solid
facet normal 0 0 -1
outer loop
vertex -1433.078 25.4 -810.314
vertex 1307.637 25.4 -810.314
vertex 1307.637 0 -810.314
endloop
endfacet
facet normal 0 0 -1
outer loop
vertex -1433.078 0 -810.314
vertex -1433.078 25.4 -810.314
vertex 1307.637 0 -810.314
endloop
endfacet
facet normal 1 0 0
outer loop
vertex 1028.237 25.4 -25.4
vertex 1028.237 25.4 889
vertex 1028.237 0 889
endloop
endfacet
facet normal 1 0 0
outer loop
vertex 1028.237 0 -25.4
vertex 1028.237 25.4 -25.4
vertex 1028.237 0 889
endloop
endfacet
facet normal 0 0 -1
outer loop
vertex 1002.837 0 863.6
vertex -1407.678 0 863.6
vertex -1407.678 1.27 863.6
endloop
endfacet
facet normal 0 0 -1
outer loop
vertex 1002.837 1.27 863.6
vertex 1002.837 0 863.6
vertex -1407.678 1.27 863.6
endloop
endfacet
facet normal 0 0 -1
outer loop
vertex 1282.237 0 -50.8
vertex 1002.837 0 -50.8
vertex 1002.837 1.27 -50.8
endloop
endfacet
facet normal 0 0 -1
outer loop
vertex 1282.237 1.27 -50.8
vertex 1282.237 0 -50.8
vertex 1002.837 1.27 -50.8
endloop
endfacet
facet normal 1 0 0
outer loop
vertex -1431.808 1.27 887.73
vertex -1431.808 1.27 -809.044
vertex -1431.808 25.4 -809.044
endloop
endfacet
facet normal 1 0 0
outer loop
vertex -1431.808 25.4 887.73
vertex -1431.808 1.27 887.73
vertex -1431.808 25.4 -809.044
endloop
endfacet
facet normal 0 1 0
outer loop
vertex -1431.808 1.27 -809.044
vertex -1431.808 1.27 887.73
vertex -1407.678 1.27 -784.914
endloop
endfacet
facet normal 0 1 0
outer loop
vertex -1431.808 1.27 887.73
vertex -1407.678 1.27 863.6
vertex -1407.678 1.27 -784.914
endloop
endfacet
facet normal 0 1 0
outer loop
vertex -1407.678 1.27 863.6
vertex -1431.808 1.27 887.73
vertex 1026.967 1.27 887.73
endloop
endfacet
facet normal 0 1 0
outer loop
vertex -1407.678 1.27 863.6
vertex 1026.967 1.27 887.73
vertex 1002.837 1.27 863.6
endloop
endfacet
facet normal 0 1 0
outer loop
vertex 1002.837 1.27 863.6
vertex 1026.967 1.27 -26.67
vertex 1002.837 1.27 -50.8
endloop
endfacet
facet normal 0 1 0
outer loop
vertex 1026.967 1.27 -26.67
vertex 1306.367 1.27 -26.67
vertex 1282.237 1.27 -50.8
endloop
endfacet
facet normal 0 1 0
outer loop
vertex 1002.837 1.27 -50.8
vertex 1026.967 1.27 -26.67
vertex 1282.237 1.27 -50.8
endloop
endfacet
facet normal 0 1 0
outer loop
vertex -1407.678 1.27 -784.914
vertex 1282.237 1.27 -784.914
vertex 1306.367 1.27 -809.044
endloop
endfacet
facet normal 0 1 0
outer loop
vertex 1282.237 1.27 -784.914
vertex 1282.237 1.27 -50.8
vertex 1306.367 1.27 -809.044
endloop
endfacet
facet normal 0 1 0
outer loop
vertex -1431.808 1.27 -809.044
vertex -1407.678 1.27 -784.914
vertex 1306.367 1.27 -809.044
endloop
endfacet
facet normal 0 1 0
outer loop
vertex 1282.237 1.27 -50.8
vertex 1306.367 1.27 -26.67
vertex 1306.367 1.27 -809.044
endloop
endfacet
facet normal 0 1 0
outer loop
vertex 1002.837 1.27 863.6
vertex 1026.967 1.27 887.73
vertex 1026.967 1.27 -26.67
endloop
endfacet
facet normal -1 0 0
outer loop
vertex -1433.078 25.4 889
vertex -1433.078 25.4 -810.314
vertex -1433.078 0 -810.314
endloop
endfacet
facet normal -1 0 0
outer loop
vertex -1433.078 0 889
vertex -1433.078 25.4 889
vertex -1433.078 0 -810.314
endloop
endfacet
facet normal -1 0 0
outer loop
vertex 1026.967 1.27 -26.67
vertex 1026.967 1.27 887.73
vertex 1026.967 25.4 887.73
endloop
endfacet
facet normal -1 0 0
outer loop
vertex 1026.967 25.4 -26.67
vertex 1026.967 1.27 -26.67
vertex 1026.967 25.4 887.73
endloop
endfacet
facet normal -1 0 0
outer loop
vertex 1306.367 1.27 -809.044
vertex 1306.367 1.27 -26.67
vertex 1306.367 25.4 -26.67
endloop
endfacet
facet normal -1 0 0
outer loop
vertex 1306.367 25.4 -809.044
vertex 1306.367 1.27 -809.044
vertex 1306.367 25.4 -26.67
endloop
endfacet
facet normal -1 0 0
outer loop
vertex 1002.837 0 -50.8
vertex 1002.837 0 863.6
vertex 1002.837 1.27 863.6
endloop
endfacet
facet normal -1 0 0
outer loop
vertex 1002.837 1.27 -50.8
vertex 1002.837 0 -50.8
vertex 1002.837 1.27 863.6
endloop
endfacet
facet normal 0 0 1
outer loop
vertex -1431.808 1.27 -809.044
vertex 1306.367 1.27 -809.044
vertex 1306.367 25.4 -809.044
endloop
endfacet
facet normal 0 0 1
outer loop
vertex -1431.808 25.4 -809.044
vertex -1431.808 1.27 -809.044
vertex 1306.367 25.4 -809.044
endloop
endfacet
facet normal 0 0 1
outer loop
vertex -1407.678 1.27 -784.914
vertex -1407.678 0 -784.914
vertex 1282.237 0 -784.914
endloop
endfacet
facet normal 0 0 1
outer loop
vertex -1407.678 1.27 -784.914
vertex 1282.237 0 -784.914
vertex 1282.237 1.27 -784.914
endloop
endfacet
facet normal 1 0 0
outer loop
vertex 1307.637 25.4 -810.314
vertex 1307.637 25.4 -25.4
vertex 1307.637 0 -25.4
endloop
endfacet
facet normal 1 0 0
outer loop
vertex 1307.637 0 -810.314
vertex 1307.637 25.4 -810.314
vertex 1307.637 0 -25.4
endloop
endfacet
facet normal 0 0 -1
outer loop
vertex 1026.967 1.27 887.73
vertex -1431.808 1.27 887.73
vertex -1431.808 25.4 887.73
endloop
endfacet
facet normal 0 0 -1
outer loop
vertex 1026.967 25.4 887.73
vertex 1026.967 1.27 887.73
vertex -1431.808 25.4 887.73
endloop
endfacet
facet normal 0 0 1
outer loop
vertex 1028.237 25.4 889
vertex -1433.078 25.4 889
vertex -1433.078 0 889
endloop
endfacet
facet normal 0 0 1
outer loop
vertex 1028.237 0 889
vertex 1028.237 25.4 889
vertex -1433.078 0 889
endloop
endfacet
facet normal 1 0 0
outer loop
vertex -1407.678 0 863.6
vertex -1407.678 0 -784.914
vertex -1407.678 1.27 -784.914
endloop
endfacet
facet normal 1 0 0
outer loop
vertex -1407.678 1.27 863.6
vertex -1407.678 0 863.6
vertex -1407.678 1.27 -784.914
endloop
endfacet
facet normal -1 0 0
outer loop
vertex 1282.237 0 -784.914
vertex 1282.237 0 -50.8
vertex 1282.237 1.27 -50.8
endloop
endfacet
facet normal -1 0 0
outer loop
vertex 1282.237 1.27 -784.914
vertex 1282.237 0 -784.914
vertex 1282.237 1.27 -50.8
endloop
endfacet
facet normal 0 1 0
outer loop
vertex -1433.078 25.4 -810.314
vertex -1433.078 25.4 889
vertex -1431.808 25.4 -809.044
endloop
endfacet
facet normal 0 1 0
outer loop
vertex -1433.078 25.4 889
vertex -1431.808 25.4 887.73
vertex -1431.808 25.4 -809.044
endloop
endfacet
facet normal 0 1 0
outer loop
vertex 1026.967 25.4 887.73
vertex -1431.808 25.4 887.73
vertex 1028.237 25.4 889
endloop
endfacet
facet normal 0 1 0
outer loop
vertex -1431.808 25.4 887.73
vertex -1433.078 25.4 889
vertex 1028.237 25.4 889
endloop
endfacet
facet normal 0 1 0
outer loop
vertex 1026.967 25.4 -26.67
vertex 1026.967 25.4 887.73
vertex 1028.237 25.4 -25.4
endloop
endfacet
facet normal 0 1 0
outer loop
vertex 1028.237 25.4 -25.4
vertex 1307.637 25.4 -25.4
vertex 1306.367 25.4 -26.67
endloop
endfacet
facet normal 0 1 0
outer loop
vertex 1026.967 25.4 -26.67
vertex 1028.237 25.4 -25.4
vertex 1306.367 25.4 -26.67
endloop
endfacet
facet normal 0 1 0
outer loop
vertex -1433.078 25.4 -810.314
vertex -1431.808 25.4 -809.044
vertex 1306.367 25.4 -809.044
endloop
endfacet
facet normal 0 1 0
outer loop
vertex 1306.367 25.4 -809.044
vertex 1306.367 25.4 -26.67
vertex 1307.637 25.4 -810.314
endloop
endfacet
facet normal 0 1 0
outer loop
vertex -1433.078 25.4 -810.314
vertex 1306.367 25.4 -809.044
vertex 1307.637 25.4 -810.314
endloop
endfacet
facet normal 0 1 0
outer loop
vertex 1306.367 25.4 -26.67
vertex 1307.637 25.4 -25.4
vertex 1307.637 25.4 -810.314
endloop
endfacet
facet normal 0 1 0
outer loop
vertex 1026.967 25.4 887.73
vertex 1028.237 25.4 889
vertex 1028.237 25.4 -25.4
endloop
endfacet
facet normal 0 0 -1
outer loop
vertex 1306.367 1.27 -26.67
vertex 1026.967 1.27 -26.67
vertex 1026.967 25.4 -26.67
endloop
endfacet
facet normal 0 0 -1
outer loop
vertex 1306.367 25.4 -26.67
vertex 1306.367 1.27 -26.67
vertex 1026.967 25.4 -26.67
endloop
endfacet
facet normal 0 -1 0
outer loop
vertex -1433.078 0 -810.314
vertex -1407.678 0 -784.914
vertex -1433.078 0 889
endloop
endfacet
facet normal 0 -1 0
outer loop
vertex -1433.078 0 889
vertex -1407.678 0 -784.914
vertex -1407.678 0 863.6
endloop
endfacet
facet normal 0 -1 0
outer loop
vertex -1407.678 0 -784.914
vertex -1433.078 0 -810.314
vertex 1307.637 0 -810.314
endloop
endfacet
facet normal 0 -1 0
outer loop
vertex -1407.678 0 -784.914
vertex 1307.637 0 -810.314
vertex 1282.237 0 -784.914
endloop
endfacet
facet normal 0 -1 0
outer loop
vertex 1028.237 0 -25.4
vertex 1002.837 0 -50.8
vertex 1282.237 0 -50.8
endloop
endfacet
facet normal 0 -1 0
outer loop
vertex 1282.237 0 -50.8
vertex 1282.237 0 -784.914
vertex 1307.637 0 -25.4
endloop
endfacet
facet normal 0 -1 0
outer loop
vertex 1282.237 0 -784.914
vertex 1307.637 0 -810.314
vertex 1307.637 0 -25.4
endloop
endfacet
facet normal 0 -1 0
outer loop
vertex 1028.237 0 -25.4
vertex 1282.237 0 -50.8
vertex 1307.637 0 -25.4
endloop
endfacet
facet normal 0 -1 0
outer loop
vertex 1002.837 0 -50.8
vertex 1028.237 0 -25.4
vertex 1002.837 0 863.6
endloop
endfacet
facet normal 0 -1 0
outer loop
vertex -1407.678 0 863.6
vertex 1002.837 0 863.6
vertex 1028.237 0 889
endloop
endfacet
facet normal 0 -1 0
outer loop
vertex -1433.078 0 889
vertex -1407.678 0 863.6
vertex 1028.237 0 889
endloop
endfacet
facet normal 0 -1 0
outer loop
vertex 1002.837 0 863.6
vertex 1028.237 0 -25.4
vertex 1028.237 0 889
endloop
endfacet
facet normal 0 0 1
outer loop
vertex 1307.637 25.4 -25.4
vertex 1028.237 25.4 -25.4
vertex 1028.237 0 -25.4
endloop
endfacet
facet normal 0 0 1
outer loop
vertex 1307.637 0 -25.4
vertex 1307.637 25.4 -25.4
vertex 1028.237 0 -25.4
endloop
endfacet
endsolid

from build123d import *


with BuildPart() as part:
    # Sweep1: sweep along a path in Sketch1
    with BuildLine(Plane(origin=(0, 0, 0), x_dir=(1, 0, 0), z_dir=(0, 1, 0))) as sweep1_path:
        Line((-1459.720419904, 836.957191151), (1334.279580096, 836.957191151))
        Line((1334.279580096, 836.957191151), (1334.279580096, -1.242808849))
        Line((1334.279580096, -1.242808849), (1054.879580096, -1.242808849))
        Line((1054.879580096, -1.242808849), (1054.879580096, -915.642808849))
        Line((1054.879580096, -915.642808849), (-1459.720419904, -915.642808849))
        Line((-1459.720419904, -915.642808849), (-1459.720419904, 836.957191151))
    # Sketch2 → Sweep1 (sweep)
    with BuildSketch(Plane(origin=(0, 0, 0), x_dir=(0, 0, -1), z_dir=(1, 0, 0))):
        Polygon((-887.73, 25.4), (-887.73, 1.27), (-863.6, 1.27), (-863.6, 0), (-889, 0), (-889, 25.4), align=None)
    sweep(path=sweep1_path.line, transition=Transition.RIGHT)


solid = part.part
